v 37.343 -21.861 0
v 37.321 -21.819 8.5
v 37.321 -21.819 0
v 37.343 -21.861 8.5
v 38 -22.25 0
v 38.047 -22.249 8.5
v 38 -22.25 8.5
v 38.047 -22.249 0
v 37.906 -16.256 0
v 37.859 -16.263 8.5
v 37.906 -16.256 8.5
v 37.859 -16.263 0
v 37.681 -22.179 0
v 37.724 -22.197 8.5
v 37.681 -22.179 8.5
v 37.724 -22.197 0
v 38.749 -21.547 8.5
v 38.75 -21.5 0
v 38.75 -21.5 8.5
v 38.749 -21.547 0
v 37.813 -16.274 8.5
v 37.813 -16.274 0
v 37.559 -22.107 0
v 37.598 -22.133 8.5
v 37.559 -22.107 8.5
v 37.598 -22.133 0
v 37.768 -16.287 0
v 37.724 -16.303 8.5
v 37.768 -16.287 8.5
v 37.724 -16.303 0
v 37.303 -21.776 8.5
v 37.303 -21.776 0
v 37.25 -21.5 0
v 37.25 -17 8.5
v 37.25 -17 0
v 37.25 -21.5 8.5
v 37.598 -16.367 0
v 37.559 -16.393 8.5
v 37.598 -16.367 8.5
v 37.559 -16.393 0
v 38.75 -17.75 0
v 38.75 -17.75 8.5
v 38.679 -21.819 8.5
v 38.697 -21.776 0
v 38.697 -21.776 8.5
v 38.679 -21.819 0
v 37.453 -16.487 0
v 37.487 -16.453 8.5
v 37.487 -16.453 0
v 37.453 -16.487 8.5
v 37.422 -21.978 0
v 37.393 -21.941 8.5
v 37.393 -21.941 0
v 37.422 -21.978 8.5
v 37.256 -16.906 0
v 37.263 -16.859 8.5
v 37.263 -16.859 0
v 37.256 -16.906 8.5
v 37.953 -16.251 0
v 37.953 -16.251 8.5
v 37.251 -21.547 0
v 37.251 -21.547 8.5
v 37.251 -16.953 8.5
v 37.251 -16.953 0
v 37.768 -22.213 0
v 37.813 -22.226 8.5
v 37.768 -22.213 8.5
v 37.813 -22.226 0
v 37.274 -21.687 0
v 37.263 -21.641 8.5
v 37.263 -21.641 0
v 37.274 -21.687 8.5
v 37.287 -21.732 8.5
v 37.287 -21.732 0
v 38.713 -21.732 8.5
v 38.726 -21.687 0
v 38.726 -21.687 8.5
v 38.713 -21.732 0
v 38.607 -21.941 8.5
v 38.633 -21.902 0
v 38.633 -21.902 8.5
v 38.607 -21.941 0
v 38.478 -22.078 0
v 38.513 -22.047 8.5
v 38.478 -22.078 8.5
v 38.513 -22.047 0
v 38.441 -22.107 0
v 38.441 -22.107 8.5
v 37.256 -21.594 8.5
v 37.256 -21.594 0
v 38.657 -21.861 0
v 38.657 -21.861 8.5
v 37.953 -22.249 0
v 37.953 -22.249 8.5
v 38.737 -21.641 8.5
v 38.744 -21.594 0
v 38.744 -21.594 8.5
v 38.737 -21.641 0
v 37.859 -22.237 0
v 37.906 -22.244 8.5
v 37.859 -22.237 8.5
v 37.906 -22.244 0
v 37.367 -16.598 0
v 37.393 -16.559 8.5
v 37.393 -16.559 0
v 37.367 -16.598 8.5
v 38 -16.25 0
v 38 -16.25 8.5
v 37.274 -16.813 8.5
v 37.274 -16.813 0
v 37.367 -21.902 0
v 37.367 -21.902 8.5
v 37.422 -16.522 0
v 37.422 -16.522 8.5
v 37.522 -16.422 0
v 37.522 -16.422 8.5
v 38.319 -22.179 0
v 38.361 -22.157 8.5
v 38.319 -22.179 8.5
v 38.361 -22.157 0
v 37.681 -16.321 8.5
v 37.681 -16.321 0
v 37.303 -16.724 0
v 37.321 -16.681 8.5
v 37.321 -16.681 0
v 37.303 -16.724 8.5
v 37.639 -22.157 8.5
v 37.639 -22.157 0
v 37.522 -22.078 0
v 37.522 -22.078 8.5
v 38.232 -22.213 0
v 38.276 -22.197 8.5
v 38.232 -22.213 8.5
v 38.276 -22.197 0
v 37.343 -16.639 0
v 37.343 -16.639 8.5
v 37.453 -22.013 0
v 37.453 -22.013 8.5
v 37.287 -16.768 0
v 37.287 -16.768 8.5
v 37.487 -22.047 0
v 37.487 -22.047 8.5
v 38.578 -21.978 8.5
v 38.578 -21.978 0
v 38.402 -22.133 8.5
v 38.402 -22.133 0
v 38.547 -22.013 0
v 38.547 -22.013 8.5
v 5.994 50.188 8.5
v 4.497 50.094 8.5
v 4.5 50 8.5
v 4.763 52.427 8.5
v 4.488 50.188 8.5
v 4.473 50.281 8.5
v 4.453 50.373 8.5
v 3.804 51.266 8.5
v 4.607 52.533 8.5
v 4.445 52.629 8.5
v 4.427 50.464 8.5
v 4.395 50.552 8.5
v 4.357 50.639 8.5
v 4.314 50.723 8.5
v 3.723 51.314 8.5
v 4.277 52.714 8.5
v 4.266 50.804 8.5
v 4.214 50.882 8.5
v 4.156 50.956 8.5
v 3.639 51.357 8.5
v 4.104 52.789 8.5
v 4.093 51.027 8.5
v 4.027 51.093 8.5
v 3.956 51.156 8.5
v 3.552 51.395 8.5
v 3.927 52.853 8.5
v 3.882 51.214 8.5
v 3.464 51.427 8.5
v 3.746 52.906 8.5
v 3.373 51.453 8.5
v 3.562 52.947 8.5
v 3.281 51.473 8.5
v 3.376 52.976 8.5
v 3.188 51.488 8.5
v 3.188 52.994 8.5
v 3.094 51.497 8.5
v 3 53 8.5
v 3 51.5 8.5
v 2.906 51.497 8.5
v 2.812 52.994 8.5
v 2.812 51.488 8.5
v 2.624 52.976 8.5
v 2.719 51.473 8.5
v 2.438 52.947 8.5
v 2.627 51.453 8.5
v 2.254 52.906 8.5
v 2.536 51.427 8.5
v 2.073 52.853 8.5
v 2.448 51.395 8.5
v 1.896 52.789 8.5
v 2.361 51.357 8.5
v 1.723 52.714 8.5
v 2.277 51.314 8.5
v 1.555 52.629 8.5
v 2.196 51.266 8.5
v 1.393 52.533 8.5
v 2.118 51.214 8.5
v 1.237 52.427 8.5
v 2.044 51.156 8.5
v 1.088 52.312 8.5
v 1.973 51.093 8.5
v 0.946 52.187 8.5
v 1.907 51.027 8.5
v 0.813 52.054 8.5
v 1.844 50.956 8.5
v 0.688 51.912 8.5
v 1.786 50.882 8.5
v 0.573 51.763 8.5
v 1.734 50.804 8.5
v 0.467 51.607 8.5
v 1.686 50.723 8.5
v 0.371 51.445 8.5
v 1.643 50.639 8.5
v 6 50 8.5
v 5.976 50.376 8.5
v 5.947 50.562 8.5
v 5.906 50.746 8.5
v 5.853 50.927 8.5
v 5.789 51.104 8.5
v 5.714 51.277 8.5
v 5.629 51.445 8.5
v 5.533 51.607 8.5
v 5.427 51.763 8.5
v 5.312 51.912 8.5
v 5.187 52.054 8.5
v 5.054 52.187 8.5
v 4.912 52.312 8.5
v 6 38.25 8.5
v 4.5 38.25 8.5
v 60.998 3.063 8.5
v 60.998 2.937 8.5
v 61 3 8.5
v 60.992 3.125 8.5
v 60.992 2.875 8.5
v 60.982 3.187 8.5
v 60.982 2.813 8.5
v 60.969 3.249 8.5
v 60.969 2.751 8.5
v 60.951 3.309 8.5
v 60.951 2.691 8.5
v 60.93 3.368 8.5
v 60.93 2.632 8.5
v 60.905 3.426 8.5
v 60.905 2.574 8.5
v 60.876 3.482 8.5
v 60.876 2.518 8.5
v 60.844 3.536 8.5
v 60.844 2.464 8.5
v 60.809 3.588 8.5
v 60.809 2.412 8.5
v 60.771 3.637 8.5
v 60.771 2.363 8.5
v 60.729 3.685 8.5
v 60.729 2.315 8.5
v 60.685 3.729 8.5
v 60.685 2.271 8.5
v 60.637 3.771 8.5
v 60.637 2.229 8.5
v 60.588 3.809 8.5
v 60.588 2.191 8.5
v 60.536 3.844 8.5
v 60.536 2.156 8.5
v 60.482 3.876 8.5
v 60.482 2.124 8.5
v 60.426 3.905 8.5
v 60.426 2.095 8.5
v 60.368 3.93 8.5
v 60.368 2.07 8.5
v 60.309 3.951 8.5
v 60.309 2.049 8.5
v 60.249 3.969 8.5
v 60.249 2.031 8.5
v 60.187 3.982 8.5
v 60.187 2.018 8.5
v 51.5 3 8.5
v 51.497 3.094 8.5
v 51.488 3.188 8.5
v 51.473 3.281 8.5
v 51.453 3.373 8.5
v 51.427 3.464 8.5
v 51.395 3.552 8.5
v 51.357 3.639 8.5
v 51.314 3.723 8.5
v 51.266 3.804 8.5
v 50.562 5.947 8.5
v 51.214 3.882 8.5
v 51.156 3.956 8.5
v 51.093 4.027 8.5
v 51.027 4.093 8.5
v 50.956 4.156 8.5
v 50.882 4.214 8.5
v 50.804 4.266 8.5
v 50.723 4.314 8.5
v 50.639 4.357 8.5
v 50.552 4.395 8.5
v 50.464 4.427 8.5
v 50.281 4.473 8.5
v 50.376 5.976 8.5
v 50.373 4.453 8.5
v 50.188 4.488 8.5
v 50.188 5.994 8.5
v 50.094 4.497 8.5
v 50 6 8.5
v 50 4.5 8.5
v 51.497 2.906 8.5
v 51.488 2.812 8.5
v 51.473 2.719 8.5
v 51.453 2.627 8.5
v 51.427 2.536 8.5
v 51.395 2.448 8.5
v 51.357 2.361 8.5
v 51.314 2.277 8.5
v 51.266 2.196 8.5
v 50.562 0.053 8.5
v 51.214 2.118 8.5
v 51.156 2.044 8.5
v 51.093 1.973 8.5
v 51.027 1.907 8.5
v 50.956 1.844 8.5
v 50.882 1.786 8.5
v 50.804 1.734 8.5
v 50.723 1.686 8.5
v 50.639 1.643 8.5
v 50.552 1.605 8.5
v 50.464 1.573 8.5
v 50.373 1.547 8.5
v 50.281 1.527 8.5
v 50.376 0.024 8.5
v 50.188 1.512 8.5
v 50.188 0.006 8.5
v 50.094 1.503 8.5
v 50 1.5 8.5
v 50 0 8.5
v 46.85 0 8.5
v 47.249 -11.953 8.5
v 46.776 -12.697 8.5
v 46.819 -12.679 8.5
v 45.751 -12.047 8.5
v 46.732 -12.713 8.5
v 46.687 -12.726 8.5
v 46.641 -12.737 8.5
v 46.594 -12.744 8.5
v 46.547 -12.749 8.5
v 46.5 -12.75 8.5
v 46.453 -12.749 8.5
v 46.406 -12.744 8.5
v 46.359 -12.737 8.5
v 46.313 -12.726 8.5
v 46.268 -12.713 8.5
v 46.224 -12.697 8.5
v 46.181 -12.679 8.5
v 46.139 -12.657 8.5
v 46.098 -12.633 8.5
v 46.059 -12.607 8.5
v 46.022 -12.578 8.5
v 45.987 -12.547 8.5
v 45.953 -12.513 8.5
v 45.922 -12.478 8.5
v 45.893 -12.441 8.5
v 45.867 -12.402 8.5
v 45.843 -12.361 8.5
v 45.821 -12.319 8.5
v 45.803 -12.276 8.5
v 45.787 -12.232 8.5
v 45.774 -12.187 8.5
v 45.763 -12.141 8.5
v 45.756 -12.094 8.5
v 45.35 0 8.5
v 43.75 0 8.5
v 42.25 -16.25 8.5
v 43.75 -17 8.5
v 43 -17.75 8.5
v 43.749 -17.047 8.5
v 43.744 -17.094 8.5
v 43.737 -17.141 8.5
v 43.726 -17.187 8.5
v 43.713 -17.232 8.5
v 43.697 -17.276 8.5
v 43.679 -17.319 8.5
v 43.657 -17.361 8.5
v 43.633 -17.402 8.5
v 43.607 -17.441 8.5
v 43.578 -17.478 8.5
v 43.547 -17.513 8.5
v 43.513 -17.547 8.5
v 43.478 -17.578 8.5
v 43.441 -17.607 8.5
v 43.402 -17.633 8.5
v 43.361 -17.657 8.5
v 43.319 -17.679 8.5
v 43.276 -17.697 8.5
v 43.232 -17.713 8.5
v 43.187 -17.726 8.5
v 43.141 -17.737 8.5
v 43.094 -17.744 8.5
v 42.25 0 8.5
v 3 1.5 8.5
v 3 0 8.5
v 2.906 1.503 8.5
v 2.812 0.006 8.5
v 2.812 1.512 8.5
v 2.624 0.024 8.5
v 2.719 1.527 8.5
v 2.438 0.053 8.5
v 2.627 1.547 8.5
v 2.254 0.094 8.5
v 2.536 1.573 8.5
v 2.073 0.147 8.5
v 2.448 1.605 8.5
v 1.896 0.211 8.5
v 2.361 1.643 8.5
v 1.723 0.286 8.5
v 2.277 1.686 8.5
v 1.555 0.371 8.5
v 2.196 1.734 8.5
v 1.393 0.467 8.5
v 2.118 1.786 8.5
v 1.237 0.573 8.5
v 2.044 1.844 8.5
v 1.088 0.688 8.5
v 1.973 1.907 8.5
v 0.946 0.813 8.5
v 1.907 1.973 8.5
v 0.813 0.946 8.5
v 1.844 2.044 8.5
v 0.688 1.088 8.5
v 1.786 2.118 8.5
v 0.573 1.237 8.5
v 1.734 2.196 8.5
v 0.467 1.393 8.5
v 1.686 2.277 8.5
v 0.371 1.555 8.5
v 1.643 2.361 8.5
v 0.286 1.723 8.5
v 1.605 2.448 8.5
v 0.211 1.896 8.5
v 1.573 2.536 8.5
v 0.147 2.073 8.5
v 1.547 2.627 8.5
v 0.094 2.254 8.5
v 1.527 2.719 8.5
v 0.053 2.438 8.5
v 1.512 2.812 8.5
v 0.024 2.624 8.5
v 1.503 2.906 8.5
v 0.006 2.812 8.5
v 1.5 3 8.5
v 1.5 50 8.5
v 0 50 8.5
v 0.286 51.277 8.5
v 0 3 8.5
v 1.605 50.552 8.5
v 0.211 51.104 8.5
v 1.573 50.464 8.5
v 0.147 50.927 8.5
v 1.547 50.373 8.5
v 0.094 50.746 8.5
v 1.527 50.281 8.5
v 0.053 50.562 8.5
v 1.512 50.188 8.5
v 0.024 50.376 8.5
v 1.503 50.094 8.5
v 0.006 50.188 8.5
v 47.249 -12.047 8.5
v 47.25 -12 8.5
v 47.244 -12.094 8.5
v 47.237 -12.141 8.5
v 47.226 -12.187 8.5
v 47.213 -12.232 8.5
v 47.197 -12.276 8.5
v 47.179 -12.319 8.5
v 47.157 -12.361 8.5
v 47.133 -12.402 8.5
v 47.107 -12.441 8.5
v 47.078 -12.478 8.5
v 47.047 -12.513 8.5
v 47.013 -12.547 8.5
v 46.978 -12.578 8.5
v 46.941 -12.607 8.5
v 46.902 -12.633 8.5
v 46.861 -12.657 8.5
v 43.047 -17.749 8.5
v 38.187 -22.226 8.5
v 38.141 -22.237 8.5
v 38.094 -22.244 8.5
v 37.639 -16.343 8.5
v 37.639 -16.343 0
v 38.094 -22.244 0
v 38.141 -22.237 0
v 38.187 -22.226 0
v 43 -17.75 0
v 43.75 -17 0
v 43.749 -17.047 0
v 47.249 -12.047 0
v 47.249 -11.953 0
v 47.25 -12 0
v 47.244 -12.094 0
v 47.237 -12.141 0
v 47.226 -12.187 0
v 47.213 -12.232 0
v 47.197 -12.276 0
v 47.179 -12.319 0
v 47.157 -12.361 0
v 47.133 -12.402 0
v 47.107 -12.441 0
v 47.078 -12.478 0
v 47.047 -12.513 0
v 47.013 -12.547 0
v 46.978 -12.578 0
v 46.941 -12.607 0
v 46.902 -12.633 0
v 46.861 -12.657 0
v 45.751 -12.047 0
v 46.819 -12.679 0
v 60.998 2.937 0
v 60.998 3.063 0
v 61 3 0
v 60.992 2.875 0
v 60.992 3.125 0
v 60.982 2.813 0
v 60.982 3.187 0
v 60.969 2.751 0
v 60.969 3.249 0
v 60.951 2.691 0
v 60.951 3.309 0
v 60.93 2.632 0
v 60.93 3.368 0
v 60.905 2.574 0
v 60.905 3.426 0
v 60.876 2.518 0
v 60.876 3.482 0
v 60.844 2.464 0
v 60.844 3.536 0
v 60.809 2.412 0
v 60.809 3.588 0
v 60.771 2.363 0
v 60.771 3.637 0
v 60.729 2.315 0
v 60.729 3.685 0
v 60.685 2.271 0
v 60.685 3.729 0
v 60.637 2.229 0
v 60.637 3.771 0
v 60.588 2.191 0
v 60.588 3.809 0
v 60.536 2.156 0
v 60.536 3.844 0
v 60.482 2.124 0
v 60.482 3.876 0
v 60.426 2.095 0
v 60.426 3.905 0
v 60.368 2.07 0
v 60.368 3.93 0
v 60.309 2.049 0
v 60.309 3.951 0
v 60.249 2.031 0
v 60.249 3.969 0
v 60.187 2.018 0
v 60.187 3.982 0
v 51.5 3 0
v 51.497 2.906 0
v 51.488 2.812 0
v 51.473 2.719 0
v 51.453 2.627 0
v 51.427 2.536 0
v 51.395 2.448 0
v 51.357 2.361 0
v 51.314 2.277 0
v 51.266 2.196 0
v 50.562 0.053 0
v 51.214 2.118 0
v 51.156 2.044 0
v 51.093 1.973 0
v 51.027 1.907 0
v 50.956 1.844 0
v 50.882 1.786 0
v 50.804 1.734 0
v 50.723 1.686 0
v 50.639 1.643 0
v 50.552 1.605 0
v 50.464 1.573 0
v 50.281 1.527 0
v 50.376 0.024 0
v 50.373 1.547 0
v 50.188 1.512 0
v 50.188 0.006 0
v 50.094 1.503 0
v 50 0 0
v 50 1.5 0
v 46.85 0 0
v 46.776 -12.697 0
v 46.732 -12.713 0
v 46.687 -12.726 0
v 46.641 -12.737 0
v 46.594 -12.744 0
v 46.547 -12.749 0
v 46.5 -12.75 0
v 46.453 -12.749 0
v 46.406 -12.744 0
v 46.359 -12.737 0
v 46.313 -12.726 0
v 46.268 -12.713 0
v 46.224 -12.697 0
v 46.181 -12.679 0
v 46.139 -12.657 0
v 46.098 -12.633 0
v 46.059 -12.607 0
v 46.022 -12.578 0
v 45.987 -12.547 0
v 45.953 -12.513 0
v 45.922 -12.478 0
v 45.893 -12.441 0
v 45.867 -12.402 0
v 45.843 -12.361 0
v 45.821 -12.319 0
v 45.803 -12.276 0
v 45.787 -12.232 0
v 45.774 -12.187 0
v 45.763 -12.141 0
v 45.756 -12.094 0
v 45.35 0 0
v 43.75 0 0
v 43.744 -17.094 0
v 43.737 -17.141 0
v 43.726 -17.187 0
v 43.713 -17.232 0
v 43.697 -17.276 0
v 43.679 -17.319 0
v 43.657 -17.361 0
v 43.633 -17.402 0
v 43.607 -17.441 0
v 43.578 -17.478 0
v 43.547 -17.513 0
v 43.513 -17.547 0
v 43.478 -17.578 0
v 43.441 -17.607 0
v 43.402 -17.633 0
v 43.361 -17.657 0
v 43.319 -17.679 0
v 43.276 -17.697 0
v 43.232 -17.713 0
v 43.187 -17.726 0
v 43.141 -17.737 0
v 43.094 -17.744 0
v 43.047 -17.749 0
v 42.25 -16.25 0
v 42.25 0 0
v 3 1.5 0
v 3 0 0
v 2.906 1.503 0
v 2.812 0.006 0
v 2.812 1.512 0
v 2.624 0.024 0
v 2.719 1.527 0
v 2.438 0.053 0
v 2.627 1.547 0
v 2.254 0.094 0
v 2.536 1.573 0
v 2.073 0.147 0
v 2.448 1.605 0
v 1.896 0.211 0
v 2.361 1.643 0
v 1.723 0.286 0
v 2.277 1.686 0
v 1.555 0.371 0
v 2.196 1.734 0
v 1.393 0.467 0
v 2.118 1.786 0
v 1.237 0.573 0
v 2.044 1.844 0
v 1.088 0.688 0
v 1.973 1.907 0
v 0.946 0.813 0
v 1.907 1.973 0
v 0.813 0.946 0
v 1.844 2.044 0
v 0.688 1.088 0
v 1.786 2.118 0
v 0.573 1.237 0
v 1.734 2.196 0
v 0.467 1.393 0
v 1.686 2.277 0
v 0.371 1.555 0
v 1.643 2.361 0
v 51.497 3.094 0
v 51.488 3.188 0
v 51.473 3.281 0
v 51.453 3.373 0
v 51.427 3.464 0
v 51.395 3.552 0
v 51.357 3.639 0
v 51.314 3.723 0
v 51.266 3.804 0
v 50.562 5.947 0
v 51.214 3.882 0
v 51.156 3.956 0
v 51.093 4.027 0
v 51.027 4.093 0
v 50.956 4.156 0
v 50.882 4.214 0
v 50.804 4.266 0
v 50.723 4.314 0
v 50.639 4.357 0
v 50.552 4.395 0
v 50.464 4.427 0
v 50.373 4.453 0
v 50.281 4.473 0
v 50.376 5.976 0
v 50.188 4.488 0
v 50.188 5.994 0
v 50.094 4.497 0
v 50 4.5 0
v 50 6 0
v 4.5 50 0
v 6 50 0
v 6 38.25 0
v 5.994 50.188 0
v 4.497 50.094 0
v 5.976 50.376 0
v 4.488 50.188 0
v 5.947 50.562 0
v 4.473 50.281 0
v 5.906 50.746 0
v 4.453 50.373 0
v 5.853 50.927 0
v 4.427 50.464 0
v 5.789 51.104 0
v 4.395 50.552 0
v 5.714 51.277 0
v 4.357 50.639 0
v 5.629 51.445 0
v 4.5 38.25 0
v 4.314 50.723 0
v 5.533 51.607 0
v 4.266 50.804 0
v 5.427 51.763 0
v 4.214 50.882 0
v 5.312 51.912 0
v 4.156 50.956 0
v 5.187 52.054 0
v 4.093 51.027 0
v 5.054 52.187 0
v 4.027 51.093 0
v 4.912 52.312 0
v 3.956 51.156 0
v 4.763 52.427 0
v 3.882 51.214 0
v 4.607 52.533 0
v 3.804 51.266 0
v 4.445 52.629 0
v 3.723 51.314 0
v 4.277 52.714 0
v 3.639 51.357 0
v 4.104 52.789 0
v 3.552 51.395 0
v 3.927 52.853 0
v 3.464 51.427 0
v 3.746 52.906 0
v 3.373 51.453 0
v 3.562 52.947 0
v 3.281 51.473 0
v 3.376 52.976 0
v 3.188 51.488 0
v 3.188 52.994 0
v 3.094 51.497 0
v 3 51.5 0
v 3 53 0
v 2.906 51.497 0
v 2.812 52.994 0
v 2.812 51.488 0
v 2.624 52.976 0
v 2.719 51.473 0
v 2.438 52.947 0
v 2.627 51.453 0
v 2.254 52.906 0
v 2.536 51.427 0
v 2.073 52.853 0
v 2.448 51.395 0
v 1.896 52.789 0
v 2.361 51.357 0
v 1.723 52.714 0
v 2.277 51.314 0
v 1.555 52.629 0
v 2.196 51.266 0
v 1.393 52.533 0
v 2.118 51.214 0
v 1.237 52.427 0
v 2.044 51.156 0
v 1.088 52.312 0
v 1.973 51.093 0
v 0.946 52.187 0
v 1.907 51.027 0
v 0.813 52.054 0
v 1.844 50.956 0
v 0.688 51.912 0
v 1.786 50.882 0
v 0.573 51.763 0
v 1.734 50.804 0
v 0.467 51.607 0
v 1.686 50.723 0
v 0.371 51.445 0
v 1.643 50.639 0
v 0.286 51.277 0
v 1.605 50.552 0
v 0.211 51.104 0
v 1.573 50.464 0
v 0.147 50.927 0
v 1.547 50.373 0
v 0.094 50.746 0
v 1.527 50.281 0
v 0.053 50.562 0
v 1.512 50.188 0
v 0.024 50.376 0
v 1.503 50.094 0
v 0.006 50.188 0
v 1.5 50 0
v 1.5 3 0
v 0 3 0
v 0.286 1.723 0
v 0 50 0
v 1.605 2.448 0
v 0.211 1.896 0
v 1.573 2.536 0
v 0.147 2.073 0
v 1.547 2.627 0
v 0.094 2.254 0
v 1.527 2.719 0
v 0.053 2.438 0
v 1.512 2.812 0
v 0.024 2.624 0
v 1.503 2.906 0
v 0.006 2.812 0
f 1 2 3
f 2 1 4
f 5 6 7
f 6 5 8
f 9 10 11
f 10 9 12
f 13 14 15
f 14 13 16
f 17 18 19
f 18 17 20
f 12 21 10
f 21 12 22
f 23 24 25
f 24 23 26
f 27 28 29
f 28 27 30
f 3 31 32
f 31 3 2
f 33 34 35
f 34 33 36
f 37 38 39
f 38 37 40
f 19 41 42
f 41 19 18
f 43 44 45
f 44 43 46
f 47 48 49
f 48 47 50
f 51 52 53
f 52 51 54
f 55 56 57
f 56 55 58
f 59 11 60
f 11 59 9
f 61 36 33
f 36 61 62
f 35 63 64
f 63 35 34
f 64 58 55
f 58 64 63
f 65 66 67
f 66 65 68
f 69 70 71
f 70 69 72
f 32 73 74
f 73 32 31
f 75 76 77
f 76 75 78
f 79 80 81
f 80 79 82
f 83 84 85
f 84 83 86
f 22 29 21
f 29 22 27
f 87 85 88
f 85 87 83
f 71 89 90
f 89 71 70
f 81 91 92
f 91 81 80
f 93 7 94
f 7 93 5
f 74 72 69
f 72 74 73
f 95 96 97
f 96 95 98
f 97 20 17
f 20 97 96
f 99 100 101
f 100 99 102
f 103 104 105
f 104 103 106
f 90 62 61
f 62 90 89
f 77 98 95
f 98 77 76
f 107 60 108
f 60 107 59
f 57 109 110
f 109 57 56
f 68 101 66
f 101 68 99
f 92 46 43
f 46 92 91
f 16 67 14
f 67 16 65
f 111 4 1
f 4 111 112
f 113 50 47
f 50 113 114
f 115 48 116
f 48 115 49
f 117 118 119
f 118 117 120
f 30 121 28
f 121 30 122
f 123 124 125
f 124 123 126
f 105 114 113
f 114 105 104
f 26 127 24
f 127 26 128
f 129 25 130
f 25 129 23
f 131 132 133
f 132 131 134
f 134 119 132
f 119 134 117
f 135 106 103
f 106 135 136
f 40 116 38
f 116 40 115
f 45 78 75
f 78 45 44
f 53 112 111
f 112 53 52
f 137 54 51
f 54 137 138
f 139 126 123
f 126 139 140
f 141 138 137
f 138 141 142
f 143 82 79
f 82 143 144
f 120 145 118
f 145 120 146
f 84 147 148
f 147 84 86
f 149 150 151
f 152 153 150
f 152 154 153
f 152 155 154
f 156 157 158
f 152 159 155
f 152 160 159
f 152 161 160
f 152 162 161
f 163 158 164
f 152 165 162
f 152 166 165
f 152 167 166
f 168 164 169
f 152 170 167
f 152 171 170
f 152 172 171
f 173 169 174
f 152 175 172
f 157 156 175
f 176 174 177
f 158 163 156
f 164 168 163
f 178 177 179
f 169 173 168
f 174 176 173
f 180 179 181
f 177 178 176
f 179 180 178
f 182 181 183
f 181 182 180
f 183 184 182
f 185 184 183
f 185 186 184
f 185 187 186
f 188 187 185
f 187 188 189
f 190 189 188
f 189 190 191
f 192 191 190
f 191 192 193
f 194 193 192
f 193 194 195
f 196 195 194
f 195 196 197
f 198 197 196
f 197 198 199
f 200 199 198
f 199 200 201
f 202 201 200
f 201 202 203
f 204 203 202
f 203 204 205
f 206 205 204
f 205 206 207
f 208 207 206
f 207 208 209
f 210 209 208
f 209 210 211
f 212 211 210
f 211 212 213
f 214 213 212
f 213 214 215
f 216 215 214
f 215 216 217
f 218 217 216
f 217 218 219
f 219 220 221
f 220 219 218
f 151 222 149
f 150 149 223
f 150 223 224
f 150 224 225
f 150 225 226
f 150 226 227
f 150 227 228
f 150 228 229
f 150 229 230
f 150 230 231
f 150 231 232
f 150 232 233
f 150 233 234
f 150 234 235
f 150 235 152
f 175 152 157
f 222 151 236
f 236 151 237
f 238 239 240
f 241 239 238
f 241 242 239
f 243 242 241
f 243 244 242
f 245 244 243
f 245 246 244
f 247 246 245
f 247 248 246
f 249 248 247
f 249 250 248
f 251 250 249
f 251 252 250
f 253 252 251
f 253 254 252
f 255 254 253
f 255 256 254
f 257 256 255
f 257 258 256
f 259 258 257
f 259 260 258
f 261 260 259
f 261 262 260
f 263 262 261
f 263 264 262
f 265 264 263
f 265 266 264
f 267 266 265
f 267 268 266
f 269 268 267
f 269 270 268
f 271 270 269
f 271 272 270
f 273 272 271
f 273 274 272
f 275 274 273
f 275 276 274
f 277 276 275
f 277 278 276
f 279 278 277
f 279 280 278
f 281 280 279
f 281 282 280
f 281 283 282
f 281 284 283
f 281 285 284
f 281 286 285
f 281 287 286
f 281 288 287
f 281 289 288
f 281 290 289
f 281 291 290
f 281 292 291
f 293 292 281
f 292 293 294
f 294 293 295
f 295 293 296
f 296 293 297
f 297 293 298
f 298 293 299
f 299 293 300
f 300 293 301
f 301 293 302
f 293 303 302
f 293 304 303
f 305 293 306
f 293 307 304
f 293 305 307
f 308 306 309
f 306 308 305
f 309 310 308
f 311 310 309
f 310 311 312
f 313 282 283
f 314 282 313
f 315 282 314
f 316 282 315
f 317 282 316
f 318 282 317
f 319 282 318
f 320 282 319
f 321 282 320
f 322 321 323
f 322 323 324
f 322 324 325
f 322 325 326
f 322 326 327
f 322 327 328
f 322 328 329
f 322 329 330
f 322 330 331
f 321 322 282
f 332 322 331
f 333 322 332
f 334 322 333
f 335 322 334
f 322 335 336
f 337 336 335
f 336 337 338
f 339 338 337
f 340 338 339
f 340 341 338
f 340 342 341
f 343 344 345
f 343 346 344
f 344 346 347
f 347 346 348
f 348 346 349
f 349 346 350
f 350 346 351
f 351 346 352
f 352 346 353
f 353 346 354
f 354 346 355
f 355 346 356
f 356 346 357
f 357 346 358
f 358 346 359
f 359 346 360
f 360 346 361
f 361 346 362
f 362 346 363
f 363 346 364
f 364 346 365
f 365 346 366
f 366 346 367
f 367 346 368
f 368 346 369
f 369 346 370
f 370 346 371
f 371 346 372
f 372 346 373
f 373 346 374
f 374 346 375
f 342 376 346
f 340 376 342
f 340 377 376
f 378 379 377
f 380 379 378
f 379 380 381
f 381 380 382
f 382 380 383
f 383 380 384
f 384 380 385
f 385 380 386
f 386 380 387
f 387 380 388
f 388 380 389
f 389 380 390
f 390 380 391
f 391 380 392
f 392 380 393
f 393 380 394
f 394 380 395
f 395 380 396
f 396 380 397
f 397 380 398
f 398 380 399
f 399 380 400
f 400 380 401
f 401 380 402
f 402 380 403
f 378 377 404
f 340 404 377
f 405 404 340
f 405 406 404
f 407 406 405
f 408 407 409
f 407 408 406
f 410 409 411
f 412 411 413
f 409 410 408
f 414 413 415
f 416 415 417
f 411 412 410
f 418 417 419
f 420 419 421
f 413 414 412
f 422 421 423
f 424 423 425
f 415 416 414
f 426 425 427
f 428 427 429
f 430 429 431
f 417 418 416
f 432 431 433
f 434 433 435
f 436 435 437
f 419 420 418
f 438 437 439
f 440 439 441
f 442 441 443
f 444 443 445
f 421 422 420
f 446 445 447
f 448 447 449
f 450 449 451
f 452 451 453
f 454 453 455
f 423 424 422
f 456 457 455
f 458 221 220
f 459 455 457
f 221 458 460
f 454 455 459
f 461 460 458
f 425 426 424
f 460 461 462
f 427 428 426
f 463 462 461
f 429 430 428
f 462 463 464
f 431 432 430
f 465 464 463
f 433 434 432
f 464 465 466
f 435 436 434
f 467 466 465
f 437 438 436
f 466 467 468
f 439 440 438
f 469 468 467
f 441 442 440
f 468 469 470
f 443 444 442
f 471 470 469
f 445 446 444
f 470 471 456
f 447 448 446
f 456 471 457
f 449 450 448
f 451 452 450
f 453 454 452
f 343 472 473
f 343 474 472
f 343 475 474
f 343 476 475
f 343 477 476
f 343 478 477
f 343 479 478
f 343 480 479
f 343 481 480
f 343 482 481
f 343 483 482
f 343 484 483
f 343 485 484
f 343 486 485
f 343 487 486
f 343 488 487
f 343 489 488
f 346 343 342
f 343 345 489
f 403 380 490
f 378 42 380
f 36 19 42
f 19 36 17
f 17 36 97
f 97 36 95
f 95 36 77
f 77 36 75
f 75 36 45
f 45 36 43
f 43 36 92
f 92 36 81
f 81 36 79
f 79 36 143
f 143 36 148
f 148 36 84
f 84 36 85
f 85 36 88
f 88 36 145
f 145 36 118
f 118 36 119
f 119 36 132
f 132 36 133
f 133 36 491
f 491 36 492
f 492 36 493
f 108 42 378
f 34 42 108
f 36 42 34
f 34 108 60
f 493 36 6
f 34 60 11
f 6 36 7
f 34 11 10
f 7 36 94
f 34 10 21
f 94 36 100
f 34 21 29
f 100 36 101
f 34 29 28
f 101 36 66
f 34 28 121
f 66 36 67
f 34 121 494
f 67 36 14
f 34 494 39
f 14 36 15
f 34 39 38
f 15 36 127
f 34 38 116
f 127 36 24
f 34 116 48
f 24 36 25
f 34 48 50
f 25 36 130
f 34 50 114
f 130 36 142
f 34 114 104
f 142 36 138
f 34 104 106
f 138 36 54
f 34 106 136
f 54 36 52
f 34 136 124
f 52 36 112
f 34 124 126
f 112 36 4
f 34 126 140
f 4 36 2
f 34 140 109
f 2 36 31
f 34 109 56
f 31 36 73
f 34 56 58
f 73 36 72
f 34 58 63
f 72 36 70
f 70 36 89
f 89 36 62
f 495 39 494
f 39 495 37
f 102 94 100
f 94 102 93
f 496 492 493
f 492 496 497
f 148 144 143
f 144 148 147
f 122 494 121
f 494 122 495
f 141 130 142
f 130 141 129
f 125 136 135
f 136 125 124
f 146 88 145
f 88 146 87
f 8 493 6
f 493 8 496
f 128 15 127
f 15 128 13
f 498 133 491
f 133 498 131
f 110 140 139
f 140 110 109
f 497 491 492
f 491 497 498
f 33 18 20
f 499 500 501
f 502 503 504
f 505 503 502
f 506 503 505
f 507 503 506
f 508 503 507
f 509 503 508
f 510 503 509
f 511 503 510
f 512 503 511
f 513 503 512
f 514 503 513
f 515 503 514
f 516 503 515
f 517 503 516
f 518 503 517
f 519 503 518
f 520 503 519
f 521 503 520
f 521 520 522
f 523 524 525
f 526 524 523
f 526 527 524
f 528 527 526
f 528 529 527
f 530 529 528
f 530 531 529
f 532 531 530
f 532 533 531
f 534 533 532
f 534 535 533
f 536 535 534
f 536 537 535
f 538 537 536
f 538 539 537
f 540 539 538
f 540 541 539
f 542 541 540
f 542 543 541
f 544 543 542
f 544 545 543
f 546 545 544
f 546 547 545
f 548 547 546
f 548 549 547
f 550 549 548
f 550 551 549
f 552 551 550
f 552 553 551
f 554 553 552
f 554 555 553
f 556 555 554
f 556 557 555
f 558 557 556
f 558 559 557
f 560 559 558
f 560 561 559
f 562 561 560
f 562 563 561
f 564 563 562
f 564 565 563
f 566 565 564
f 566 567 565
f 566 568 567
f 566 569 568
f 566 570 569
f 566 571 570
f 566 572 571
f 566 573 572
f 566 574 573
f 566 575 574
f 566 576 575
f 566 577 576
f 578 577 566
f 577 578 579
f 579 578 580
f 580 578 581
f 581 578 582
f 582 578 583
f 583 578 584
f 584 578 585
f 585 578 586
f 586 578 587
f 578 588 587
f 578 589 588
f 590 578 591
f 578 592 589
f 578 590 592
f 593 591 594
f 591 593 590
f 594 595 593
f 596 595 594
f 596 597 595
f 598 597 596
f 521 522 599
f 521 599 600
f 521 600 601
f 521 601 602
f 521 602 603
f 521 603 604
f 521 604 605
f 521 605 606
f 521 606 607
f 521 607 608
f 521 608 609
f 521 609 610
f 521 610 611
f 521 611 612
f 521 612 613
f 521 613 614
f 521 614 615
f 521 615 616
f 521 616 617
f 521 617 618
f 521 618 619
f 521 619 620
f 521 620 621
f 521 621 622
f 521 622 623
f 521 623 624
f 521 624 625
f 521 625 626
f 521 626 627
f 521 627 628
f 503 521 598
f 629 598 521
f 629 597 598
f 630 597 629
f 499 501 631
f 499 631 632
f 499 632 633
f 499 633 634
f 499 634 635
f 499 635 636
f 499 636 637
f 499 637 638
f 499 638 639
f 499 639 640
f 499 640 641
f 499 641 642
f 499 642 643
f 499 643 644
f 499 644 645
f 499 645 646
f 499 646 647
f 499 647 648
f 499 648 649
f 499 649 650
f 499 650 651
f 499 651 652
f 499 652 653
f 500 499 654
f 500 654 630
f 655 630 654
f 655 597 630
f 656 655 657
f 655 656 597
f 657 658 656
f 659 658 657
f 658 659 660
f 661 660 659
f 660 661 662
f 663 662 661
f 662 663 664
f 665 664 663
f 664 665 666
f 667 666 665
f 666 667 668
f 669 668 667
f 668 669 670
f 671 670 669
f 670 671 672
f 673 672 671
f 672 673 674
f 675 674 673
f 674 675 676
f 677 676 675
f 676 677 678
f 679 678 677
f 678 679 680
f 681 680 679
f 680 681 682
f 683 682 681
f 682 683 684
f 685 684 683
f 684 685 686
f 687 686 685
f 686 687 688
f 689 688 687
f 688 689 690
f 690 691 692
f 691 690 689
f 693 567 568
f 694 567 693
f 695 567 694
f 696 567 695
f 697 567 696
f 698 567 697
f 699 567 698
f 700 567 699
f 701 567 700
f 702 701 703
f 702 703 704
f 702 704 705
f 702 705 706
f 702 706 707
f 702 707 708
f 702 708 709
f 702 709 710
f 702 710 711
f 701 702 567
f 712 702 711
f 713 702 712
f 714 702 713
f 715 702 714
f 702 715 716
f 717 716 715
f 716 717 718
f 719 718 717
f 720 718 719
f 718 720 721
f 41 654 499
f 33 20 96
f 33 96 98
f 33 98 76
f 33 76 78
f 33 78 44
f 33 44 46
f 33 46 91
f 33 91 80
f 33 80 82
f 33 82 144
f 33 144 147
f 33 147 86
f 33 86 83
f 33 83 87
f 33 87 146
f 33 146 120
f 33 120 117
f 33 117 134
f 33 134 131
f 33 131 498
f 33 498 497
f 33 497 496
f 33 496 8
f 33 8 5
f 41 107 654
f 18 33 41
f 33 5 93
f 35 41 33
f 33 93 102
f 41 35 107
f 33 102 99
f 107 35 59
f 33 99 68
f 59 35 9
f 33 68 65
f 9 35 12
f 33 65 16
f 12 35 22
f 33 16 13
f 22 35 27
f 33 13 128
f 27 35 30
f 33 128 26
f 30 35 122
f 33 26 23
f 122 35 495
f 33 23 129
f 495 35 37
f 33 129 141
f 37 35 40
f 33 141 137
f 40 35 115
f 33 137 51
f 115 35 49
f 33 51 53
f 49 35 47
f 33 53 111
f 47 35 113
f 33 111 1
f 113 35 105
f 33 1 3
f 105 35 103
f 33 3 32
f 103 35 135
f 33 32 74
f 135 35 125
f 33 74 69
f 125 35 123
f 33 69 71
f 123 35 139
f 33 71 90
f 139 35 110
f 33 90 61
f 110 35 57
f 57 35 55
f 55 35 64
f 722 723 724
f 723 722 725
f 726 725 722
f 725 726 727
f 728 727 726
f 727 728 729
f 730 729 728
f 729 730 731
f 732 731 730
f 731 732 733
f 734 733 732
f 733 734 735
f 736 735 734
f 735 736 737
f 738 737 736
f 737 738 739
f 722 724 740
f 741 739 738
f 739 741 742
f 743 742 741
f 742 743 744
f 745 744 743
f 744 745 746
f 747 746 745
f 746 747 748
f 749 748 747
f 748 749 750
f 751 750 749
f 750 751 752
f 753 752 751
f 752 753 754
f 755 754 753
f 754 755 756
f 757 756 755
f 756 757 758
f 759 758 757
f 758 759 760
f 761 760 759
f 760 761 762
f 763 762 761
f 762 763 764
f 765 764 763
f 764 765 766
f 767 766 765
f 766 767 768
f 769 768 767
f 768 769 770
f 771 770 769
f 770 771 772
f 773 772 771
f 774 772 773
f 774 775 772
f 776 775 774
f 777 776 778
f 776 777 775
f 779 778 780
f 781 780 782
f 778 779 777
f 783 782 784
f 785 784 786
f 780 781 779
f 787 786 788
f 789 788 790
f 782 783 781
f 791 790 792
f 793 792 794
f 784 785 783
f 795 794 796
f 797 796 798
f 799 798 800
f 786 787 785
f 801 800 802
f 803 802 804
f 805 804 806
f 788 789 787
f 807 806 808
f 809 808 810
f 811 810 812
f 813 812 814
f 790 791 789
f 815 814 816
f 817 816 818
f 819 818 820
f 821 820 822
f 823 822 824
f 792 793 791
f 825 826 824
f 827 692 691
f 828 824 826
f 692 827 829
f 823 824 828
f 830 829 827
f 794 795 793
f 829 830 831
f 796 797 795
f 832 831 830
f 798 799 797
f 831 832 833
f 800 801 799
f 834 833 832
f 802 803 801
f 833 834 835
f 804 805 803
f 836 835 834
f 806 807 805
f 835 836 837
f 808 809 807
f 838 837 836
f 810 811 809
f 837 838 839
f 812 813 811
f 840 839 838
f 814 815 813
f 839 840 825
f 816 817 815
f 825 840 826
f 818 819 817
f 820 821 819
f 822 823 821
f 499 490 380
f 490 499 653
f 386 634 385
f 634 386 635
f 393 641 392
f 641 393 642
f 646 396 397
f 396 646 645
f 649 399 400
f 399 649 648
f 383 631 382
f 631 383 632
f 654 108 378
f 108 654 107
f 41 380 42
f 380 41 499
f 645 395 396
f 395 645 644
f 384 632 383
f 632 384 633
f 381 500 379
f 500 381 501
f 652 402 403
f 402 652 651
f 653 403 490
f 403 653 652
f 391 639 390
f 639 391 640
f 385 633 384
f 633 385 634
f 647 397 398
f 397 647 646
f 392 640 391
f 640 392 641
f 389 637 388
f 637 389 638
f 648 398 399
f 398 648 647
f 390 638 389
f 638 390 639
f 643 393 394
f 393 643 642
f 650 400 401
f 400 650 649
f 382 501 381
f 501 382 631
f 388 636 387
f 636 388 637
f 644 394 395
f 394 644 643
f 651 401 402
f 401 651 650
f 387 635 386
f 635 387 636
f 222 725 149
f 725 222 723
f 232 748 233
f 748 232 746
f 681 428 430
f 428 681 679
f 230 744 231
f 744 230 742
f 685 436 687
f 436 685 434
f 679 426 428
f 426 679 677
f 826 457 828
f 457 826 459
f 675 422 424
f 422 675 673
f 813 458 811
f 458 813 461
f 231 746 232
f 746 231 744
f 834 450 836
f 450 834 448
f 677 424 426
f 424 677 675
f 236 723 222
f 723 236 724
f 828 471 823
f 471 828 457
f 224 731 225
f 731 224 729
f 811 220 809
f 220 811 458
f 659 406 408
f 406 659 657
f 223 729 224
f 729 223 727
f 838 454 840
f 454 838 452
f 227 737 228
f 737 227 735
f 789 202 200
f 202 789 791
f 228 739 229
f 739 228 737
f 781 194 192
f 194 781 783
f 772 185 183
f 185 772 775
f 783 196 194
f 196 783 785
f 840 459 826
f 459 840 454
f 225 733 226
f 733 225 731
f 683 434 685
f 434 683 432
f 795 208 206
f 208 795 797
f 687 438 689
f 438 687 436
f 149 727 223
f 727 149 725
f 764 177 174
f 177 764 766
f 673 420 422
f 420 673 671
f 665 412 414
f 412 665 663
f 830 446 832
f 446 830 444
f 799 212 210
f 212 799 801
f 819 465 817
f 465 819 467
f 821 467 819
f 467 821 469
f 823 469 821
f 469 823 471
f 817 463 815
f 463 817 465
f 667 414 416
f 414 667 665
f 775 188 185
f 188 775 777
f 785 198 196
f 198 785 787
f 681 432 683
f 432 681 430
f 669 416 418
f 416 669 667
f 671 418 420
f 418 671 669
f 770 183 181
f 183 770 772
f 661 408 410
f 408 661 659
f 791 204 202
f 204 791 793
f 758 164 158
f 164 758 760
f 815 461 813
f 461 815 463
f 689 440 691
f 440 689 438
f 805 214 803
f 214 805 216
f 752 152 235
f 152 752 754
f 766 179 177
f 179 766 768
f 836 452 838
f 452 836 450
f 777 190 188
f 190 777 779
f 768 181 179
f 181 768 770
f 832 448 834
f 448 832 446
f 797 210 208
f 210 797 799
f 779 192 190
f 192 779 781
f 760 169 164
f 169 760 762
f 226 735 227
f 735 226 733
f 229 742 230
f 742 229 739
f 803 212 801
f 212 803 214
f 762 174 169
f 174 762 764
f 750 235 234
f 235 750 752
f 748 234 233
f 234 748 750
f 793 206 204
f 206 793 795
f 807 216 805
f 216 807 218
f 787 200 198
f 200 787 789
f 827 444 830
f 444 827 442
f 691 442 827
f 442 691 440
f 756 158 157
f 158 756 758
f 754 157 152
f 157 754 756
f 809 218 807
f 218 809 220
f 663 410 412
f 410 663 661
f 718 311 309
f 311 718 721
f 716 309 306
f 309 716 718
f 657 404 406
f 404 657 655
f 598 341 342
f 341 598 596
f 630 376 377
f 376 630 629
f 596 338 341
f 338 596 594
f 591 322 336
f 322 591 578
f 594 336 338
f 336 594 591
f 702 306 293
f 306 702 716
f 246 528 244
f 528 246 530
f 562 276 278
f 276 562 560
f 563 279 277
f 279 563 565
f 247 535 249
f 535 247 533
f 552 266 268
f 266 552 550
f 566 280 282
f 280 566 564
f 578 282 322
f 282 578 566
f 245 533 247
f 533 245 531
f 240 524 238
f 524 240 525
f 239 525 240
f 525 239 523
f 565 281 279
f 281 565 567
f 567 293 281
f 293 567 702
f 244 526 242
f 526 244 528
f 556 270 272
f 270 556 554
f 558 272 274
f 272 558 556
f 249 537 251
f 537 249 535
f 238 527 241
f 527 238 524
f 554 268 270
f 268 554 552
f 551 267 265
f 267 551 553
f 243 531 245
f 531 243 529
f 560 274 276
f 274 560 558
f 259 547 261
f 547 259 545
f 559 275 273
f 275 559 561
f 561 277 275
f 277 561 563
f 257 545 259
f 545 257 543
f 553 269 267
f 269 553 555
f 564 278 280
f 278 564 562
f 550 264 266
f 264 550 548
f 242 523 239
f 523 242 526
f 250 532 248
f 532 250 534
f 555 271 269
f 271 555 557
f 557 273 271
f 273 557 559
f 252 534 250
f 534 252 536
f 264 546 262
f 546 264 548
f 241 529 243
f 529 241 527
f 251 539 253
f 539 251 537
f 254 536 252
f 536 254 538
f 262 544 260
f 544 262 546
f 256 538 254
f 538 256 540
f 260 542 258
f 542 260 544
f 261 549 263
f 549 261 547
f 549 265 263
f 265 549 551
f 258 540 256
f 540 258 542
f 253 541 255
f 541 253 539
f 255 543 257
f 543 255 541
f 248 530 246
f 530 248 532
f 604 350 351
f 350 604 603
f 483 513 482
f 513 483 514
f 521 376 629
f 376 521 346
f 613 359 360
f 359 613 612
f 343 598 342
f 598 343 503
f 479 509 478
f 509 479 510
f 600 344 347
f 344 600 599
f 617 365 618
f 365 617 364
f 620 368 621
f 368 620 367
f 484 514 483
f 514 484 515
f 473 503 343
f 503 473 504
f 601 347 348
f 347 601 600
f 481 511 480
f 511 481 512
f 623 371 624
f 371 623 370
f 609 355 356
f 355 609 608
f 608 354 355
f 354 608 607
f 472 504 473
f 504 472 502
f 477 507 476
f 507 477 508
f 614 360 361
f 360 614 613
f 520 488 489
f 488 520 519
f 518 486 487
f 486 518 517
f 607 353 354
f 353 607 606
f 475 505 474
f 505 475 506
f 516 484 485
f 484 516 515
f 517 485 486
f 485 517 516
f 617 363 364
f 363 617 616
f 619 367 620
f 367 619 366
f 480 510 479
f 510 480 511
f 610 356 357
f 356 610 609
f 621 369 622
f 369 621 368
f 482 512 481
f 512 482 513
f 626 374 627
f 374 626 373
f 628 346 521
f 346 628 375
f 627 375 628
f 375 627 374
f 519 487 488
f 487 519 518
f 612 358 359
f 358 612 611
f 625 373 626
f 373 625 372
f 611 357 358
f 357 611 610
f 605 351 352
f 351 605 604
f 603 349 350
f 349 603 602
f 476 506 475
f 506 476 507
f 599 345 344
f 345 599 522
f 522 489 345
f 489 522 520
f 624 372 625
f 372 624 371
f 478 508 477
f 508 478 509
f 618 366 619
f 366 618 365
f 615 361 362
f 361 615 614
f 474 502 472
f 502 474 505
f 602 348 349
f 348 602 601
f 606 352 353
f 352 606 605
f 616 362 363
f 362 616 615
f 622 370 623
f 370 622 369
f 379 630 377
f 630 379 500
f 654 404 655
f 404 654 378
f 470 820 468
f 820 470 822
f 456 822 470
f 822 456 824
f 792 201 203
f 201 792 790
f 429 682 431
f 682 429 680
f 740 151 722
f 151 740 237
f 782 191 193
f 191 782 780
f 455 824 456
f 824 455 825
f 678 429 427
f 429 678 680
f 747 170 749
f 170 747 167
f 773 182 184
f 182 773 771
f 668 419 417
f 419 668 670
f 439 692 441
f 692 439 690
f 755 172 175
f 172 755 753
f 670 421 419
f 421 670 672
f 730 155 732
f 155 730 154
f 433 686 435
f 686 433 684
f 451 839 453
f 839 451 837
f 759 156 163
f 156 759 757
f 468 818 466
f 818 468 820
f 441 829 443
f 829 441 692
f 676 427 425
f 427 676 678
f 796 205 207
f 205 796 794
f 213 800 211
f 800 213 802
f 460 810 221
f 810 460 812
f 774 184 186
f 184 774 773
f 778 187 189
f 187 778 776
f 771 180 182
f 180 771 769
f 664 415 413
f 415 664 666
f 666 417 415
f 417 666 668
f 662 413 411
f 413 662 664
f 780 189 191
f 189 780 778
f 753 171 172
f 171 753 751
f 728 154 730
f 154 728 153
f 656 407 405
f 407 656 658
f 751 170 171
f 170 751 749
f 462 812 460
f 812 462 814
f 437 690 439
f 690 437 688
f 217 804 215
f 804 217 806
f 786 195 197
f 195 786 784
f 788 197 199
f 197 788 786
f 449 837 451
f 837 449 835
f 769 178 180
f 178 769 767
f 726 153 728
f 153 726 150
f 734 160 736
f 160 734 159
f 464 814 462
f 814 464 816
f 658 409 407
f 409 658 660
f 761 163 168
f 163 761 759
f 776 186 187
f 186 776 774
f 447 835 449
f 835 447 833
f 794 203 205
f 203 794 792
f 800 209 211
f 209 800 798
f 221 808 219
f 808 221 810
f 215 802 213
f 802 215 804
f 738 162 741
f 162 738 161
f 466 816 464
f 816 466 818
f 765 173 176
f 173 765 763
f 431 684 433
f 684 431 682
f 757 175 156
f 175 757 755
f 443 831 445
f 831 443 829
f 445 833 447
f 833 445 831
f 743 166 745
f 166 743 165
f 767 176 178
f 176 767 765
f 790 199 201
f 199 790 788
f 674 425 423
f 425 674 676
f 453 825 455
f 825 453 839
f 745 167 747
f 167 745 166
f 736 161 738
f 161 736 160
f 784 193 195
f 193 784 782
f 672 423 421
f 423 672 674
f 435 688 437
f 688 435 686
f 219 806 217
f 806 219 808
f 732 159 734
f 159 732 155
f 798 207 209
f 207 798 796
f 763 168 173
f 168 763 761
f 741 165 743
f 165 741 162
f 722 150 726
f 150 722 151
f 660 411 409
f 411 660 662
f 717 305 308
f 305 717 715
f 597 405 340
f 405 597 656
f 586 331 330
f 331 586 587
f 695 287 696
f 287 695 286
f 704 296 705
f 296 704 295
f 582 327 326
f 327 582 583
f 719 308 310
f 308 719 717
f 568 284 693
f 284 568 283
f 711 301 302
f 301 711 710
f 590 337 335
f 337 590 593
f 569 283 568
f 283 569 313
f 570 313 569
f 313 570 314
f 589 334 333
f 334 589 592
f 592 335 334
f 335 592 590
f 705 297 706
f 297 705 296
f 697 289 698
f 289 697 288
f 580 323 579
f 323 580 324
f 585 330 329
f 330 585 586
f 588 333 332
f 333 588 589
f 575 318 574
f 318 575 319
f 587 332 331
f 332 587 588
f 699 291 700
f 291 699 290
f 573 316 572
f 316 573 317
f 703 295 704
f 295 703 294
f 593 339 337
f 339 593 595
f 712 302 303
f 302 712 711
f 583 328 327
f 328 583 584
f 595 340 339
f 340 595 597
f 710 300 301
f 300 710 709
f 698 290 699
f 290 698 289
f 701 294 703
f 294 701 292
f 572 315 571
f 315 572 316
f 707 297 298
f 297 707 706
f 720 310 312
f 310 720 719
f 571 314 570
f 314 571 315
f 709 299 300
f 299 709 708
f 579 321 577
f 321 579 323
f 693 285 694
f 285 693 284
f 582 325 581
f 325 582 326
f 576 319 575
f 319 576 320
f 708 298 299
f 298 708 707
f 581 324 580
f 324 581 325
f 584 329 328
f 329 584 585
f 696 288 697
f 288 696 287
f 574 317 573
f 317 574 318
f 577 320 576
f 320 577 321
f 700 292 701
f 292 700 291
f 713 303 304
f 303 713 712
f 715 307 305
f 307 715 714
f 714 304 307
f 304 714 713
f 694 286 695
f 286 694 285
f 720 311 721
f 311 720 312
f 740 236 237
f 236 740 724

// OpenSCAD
/*
    Filament Sensor Mounting Clip For Cocoon Create
    By Brian Khuu 2019
    
    This is for a cheap filament sensor, that you can usually find on ebay.
    
*/
$fn=100;

/*
# Filament Sensor Mount
[<====y====>]
        [ ^ ]
        [ | ]
        [ x ]
        [ | ]
        [ V ]
*/
filament_mount_y_length=6;
filament_mount_x_length=5;
filament_mount_y_offset=20;
filament_mount_x_offset=40;
filament_mount_width=8.5;
filament_mount_thickness=1.5;

/*
# 3D printer Frame Clip
[<====y====>]
[ ^ ]
[ | ]
[ x ]
[ | ]
[ V ]
*/
printer_frame_tol=1;
printer_frame_clip_thickness=1.5;
printer_frame_y_lenght = 50;
printer_frame_x_lenght = 50;
metal_sheet_thickness=2+printer_frame_tol;

module sheet_metal(width)
{
    translate([0,0,-1])
    union()
    {
        hull()
        {
            translate([0,0,0])
                cylinder(r=metal_sheet_thickness/2, h=width+2);
            translate([0,printer_frame_y_lenght-metal_sheet_thickness,0])
                cylinder(r=metal_sheet_thickness/2, h=width+2);
        }
        hull()
        {
            translate([0,0,0])
                cylinder(r=metal_sheet_thickness/2, h=width+2);
            translate([printer_frame_x_lenght-metal_sheet_thickness,0,0])
                cylinder(r=metal_sheet_thickness/2, h=width+2);
        }
        cube([(printer_frame_x_lenght-metal_sheet_thickness),(printer_frame_y_lenght-metal_sheet_thickness)*3/4,width+2]);
    }
}

module sheet_metal_clip(width, thickness)
{
    diameter=metal_sheet_thickness+thickness*2;
    translate([thickness*2,thickness*2,0])
    difference()
    {
        union()
        {
            /* Clip */
            hull()
            {
                translate([0,0,0])
                    cylinder(r=diameter/2, h=width);
                translate([0,printer_frame_y_lenght-diameter/2,0])
                    cylinder(r=diameter/2, h=width);
            }
            hull()
            {
                translate([0,0,0])
                    cylinder(r=diameter/2, h=width);
                translate([printer_frame_x_lenght-diameter/2,0,0])
                    cylinder(r=diameter/2, h=width);
            }
            
            /* Tab */
            hull()
            {
                translate([printer_frame_x_lenght-diameter/2,0,0])
                    cylinder(r=diameter/2, h=width);
                translate([printer_frame_x_lenght-diameter/2+10,0,0])
                    cylinder(r=1, h=width);
            }
            
            /* Cable Clip*/
            hull()
            {
                translate([filament_mount_x_offset+filament_mount_thickness+2,-filament_mount_y_offset*3/4,0])
                    cylinder(r=filament_mount_thickness/2, h=width);
                translate([filament_mount_x_offset+filament_mount_thickness+1.5,0,0])
                    cylinder(r=filament_mount_thickness/2, h=width);
            }
            
            /* Mount Offset*/
            hull()
            {
                translate([filament_mount_x_offset,-filament_mount_y_offset,0])
                    cylinder(r=filament_mount_thickness/2, h=width);
                translate([filament_mount_x_offset,0,0])
                    cylinder(r=filament_mount_thickness/2, h=width);
            }
            
            /* Mount */
            translate([filament_mount_x_offset-filament_mount_x_length,-filament_mount_y_offset,0])
            union()
            {
                hull()
                {
                    translate([0,0,0])
                        cylinder(r=filament_mount_thickness/2, h=width);
                    translate([0,-filament_mount_y_length+filament_mount_thickness,0])
                        cylinder(r=filament_mount_thickness/2, h=width);
                }
                hull()
                {
                    translate([0,0,0])
                        cylinder(r=filament_mount_thickness/2, h=width);
                    translate([filament_mount_x_length,0,0])
                        cylinder(r=filament_mount_thickness/2, h=width);
                }
            }
            
            
        }
        sheet_metal(width);
    }
}

sheet_metal_clip(filament_mount_width,printer_frame_clip_thickness);
